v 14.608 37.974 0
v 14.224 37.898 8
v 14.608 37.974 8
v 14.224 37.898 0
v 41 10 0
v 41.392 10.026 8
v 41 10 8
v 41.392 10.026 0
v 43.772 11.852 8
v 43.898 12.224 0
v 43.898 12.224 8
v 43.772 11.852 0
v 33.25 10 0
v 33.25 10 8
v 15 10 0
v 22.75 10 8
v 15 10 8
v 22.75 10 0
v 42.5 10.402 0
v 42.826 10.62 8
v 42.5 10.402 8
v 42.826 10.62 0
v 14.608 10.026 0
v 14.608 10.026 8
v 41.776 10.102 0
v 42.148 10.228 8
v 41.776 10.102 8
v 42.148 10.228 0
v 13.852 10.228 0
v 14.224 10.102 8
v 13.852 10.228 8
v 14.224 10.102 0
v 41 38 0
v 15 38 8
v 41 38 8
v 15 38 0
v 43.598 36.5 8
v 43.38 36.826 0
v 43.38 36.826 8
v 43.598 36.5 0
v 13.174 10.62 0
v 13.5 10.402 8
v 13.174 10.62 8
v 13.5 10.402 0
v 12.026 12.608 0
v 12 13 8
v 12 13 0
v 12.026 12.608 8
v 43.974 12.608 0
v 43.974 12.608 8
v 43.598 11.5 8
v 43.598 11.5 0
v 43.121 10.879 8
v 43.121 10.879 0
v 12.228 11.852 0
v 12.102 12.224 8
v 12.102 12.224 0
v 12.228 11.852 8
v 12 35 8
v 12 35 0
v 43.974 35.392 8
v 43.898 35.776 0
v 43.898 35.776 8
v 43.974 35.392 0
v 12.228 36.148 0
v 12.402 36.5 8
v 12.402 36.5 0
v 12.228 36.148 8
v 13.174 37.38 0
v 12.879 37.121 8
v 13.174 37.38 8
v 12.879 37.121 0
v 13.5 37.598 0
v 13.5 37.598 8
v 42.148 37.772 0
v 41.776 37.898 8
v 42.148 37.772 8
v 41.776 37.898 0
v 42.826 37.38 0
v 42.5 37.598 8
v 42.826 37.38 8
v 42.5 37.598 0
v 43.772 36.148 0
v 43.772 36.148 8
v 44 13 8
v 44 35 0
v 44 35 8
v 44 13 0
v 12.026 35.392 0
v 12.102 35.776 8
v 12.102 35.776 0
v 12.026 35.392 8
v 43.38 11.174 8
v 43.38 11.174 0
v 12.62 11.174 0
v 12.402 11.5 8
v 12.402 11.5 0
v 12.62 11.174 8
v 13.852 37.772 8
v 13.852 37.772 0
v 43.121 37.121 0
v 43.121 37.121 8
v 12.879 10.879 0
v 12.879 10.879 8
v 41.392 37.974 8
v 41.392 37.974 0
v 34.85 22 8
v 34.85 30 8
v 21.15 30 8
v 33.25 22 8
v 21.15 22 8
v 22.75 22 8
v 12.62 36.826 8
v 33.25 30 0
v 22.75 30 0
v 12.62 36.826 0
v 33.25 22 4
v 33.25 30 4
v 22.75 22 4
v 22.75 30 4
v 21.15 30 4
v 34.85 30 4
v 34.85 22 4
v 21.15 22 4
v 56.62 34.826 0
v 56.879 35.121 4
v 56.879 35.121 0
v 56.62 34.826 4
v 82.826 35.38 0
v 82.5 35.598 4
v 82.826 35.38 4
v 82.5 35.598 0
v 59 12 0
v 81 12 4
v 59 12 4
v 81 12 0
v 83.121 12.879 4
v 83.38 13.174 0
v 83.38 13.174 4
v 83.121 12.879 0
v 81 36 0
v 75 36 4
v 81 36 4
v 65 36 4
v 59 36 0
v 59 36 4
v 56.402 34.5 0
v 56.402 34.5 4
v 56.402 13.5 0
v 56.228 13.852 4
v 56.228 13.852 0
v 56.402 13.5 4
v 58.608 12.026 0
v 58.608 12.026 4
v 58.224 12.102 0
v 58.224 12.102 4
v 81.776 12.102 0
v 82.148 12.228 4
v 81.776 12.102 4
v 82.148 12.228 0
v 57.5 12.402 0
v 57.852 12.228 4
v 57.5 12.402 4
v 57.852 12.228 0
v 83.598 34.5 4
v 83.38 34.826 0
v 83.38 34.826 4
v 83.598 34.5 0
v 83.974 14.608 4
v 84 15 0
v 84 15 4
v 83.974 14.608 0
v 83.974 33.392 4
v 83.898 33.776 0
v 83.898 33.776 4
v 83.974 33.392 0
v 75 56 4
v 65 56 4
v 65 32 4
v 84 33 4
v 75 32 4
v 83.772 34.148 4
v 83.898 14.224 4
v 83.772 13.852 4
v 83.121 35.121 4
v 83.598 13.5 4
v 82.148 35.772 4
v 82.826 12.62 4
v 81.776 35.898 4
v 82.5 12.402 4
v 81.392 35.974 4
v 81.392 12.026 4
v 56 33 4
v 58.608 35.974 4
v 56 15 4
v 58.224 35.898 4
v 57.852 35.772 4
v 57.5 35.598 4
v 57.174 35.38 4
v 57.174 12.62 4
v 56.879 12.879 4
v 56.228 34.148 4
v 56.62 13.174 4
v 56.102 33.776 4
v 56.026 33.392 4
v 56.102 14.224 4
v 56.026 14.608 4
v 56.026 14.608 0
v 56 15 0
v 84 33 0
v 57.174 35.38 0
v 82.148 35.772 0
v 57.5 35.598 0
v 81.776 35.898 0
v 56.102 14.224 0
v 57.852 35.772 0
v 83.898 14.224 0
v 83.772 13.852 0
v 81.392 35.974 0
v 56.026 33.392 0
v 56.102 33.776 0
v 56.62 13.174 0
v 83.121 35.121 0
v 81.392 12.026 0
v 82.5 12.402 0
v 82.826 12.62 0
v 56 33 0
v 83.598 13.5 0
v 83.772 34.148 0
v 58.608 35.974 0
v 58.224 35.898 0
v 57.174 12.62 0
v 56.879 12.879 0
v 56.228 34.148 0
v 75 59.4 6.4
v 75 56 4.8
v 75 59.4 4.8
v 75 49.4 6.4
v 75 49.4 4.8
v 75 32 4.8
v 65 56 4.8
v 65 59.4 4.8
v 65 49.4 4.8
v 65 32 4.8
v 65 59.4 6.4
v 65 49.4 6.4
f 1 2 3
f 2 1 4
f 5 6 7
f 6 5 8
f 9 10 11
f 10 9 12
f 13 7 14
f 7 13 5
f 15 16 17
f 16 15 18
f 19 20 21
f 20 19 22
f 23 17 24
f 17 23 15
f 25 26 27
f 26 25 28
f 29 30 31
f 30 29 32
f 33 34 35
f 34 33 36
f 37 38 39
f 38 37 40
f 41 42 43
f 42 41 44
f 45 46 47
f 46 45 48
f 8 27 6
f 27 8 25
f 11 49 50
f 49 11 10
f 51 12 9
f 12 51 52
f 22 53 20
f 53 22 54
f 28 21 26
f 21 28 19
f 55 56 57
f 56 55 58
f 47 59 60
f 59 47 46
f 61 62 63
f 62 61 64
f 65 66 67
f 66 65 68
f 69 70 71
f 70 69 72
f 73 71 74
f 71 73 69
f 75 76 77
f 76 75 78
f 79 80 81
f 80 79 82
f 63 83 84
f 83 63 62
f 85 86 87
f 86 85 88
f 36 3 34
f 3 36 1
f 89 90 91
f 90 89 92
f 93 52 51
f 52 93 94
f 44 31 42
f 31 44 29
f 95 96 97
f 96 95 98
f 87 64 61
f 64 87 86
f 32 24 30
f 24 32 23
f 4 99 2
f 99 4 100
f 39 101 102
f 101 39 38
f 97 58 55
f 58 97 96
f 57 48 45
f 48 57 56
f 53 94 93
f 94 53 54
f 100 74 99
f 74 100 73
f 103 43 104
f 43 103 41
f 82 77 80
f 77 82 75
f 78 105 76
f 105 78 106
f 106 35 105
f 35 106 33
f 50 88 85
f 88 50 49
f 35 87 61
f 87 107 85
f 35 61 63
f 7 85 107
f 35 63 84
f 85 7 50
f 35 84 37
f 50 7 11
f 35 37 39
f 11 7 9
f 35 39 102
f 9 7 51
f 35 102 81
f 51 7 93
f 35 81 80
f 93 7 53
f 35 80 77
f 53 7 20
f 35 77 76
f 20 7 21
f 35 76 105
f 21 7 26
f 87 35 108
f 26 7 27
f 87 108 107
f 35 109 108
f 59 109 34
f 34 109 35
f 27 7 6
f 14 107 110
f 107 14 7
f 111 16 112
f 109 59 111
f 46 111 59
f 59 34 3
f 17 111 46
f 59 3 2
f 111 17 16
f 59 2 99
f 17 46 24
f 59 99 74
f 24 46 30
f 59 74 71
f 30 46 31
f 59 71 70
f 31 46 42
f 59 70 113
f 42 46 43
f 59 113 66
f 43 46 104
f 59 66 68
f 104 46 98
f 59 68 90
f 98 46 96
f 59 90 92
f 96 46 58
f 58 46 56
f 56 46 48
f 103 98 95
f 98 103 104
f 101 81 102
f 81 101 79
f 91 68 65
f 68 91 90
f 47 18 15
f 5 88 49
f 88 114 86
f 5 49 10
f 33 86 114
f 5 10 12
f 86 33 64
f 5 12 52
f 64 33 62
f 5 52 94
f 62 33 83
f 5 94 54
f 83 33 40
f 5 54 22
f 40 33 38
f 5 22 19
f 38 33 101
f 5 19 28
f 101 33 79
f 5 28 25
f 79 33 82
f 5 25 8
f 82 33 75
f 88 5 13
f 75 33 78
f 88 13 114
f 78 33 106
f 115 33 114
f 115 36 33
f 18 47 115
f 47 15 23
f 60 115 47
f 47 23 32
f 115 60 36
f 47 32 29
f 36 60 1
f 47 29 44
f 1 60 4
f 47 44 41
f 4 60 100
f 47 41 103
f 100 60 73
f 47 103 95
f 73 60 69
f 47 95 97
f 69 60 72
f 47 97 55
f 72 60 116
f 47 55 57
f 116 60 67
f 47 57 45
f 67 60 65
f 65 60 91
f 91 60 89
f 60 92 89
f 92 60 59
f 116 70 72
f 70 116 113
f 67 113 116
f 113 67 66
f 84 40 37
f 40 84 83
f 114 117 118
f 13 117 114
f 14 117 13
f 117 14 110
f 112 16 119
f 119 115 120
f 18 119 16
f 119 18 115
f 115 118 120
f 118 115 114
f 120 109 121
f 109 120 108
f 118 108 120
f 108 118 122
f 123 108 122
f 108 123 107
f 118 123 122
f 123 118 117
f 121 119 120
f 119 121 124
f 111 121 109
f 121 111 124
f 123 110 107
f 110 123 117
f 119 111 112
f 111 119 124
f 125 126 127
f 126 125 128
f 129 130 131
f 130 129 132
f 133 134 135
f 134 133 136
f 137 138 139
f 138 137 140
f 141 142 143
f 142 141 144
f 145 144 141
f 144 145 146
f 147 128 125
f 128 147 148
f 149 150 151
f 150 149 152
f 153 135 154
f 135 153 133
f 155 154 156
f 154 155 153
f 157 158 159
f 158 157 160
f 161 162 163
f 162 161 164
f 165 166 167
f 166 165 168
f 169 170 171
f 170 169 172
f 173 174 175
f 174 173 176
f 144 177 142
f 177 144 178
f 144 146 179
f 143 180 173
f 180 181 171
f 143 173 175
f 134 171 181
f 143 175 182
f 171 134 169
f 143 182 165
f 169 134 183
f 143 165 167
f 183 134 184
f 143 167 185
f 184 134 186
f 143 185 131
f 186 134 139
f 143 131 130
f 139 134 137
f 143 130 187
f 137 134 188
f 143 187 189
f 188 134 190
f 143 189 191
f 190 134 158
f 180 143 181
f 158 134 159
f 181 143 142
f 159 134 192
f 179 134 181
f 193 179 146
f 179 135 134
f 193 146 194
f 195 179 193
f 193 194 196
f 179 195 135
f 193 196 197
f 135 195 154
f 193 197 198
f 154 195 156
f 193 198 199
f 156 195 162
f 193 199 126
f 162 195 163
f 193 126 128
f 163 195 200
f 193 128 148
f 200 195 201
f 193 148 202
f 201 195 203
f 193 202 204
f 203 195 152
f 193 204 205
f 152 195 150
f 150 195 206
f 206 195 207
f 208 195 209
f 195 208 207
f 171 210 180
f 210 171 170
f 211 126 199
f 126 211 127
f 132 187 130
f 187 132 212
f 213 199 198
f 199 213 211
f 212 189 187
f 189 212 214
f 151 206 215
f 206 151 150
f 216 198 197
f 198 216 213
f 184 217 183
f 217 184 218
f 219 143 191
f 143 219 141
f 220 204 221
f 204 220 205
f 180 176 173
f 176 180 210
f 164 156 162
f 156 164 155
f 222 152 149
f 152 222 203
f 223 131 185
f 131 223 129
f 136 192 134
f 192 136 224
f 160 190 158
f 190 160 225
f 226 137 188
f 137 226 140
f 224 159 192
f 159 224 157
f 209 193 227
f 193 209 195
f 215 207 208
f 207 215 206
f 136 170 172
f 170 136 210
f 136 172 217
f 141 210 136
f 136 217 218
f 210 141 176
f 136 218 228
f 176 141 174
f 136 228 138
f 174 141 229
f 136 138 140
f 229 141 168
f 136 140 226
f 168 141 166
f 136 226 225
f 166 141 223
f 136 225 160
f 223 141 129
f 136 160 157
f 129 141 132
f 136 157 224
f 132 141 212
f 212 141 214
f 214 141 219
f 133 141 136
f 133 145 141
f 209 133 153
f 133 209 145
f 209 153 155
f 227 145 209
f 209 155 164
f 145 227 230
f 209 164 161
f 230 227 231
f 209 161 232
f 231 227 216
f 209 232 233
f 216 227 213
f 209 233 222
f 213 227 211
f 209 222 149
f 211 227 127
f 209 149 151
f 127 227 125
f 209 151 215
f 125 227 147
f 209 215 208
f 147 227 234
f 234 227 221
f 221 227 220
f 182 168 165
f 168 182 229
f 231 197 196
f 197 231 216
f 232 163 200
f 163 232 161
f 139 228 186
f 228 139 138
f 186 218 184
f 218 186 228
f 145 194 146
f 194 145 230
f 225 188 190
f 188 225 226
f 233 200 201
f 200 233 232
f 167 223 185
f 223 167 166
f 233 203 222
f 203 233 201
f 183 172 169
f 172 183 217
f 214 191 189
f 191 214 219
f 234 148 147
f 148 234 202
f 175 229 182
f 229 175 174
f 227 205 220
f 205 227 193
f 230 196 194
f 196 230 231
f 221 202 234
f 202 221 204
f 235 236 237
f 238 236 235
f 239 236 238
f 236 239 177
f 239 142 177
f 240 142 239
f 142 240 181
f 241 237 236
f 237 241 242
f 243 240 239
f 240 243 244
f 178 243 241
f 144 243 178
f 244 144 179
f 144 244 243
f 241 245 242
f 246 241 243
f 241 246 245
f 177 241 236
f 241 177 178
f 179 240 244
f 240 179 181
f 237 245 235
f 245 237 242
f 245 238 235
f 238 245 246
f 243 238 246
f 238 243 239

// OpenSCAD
/*
Sample 069: Wiederlösbarer Kragarm-Schnapper — weich 0,8 mm
Generated from the FDM Mechanical Sample Library.
Units: millimetres.

Override examples:
  openscad -o custom.stl -D 'view="plate"' -D 'render_fn=64' model.scad
  openscad -o preview.png -D 'view="assembly"' model.scad
*/
use <../../../library/fdm_mechanisms.scad>

render_fn = is_undef(render_fn) ? 48 : render_fn;
view = is_undef(view) ? "plate" : view;
$fn = render_fn;

sample_cantilever_snap(
    view=view,
    beam_t=0.8,
    clearance=0.25,
    hook=1.6
);
